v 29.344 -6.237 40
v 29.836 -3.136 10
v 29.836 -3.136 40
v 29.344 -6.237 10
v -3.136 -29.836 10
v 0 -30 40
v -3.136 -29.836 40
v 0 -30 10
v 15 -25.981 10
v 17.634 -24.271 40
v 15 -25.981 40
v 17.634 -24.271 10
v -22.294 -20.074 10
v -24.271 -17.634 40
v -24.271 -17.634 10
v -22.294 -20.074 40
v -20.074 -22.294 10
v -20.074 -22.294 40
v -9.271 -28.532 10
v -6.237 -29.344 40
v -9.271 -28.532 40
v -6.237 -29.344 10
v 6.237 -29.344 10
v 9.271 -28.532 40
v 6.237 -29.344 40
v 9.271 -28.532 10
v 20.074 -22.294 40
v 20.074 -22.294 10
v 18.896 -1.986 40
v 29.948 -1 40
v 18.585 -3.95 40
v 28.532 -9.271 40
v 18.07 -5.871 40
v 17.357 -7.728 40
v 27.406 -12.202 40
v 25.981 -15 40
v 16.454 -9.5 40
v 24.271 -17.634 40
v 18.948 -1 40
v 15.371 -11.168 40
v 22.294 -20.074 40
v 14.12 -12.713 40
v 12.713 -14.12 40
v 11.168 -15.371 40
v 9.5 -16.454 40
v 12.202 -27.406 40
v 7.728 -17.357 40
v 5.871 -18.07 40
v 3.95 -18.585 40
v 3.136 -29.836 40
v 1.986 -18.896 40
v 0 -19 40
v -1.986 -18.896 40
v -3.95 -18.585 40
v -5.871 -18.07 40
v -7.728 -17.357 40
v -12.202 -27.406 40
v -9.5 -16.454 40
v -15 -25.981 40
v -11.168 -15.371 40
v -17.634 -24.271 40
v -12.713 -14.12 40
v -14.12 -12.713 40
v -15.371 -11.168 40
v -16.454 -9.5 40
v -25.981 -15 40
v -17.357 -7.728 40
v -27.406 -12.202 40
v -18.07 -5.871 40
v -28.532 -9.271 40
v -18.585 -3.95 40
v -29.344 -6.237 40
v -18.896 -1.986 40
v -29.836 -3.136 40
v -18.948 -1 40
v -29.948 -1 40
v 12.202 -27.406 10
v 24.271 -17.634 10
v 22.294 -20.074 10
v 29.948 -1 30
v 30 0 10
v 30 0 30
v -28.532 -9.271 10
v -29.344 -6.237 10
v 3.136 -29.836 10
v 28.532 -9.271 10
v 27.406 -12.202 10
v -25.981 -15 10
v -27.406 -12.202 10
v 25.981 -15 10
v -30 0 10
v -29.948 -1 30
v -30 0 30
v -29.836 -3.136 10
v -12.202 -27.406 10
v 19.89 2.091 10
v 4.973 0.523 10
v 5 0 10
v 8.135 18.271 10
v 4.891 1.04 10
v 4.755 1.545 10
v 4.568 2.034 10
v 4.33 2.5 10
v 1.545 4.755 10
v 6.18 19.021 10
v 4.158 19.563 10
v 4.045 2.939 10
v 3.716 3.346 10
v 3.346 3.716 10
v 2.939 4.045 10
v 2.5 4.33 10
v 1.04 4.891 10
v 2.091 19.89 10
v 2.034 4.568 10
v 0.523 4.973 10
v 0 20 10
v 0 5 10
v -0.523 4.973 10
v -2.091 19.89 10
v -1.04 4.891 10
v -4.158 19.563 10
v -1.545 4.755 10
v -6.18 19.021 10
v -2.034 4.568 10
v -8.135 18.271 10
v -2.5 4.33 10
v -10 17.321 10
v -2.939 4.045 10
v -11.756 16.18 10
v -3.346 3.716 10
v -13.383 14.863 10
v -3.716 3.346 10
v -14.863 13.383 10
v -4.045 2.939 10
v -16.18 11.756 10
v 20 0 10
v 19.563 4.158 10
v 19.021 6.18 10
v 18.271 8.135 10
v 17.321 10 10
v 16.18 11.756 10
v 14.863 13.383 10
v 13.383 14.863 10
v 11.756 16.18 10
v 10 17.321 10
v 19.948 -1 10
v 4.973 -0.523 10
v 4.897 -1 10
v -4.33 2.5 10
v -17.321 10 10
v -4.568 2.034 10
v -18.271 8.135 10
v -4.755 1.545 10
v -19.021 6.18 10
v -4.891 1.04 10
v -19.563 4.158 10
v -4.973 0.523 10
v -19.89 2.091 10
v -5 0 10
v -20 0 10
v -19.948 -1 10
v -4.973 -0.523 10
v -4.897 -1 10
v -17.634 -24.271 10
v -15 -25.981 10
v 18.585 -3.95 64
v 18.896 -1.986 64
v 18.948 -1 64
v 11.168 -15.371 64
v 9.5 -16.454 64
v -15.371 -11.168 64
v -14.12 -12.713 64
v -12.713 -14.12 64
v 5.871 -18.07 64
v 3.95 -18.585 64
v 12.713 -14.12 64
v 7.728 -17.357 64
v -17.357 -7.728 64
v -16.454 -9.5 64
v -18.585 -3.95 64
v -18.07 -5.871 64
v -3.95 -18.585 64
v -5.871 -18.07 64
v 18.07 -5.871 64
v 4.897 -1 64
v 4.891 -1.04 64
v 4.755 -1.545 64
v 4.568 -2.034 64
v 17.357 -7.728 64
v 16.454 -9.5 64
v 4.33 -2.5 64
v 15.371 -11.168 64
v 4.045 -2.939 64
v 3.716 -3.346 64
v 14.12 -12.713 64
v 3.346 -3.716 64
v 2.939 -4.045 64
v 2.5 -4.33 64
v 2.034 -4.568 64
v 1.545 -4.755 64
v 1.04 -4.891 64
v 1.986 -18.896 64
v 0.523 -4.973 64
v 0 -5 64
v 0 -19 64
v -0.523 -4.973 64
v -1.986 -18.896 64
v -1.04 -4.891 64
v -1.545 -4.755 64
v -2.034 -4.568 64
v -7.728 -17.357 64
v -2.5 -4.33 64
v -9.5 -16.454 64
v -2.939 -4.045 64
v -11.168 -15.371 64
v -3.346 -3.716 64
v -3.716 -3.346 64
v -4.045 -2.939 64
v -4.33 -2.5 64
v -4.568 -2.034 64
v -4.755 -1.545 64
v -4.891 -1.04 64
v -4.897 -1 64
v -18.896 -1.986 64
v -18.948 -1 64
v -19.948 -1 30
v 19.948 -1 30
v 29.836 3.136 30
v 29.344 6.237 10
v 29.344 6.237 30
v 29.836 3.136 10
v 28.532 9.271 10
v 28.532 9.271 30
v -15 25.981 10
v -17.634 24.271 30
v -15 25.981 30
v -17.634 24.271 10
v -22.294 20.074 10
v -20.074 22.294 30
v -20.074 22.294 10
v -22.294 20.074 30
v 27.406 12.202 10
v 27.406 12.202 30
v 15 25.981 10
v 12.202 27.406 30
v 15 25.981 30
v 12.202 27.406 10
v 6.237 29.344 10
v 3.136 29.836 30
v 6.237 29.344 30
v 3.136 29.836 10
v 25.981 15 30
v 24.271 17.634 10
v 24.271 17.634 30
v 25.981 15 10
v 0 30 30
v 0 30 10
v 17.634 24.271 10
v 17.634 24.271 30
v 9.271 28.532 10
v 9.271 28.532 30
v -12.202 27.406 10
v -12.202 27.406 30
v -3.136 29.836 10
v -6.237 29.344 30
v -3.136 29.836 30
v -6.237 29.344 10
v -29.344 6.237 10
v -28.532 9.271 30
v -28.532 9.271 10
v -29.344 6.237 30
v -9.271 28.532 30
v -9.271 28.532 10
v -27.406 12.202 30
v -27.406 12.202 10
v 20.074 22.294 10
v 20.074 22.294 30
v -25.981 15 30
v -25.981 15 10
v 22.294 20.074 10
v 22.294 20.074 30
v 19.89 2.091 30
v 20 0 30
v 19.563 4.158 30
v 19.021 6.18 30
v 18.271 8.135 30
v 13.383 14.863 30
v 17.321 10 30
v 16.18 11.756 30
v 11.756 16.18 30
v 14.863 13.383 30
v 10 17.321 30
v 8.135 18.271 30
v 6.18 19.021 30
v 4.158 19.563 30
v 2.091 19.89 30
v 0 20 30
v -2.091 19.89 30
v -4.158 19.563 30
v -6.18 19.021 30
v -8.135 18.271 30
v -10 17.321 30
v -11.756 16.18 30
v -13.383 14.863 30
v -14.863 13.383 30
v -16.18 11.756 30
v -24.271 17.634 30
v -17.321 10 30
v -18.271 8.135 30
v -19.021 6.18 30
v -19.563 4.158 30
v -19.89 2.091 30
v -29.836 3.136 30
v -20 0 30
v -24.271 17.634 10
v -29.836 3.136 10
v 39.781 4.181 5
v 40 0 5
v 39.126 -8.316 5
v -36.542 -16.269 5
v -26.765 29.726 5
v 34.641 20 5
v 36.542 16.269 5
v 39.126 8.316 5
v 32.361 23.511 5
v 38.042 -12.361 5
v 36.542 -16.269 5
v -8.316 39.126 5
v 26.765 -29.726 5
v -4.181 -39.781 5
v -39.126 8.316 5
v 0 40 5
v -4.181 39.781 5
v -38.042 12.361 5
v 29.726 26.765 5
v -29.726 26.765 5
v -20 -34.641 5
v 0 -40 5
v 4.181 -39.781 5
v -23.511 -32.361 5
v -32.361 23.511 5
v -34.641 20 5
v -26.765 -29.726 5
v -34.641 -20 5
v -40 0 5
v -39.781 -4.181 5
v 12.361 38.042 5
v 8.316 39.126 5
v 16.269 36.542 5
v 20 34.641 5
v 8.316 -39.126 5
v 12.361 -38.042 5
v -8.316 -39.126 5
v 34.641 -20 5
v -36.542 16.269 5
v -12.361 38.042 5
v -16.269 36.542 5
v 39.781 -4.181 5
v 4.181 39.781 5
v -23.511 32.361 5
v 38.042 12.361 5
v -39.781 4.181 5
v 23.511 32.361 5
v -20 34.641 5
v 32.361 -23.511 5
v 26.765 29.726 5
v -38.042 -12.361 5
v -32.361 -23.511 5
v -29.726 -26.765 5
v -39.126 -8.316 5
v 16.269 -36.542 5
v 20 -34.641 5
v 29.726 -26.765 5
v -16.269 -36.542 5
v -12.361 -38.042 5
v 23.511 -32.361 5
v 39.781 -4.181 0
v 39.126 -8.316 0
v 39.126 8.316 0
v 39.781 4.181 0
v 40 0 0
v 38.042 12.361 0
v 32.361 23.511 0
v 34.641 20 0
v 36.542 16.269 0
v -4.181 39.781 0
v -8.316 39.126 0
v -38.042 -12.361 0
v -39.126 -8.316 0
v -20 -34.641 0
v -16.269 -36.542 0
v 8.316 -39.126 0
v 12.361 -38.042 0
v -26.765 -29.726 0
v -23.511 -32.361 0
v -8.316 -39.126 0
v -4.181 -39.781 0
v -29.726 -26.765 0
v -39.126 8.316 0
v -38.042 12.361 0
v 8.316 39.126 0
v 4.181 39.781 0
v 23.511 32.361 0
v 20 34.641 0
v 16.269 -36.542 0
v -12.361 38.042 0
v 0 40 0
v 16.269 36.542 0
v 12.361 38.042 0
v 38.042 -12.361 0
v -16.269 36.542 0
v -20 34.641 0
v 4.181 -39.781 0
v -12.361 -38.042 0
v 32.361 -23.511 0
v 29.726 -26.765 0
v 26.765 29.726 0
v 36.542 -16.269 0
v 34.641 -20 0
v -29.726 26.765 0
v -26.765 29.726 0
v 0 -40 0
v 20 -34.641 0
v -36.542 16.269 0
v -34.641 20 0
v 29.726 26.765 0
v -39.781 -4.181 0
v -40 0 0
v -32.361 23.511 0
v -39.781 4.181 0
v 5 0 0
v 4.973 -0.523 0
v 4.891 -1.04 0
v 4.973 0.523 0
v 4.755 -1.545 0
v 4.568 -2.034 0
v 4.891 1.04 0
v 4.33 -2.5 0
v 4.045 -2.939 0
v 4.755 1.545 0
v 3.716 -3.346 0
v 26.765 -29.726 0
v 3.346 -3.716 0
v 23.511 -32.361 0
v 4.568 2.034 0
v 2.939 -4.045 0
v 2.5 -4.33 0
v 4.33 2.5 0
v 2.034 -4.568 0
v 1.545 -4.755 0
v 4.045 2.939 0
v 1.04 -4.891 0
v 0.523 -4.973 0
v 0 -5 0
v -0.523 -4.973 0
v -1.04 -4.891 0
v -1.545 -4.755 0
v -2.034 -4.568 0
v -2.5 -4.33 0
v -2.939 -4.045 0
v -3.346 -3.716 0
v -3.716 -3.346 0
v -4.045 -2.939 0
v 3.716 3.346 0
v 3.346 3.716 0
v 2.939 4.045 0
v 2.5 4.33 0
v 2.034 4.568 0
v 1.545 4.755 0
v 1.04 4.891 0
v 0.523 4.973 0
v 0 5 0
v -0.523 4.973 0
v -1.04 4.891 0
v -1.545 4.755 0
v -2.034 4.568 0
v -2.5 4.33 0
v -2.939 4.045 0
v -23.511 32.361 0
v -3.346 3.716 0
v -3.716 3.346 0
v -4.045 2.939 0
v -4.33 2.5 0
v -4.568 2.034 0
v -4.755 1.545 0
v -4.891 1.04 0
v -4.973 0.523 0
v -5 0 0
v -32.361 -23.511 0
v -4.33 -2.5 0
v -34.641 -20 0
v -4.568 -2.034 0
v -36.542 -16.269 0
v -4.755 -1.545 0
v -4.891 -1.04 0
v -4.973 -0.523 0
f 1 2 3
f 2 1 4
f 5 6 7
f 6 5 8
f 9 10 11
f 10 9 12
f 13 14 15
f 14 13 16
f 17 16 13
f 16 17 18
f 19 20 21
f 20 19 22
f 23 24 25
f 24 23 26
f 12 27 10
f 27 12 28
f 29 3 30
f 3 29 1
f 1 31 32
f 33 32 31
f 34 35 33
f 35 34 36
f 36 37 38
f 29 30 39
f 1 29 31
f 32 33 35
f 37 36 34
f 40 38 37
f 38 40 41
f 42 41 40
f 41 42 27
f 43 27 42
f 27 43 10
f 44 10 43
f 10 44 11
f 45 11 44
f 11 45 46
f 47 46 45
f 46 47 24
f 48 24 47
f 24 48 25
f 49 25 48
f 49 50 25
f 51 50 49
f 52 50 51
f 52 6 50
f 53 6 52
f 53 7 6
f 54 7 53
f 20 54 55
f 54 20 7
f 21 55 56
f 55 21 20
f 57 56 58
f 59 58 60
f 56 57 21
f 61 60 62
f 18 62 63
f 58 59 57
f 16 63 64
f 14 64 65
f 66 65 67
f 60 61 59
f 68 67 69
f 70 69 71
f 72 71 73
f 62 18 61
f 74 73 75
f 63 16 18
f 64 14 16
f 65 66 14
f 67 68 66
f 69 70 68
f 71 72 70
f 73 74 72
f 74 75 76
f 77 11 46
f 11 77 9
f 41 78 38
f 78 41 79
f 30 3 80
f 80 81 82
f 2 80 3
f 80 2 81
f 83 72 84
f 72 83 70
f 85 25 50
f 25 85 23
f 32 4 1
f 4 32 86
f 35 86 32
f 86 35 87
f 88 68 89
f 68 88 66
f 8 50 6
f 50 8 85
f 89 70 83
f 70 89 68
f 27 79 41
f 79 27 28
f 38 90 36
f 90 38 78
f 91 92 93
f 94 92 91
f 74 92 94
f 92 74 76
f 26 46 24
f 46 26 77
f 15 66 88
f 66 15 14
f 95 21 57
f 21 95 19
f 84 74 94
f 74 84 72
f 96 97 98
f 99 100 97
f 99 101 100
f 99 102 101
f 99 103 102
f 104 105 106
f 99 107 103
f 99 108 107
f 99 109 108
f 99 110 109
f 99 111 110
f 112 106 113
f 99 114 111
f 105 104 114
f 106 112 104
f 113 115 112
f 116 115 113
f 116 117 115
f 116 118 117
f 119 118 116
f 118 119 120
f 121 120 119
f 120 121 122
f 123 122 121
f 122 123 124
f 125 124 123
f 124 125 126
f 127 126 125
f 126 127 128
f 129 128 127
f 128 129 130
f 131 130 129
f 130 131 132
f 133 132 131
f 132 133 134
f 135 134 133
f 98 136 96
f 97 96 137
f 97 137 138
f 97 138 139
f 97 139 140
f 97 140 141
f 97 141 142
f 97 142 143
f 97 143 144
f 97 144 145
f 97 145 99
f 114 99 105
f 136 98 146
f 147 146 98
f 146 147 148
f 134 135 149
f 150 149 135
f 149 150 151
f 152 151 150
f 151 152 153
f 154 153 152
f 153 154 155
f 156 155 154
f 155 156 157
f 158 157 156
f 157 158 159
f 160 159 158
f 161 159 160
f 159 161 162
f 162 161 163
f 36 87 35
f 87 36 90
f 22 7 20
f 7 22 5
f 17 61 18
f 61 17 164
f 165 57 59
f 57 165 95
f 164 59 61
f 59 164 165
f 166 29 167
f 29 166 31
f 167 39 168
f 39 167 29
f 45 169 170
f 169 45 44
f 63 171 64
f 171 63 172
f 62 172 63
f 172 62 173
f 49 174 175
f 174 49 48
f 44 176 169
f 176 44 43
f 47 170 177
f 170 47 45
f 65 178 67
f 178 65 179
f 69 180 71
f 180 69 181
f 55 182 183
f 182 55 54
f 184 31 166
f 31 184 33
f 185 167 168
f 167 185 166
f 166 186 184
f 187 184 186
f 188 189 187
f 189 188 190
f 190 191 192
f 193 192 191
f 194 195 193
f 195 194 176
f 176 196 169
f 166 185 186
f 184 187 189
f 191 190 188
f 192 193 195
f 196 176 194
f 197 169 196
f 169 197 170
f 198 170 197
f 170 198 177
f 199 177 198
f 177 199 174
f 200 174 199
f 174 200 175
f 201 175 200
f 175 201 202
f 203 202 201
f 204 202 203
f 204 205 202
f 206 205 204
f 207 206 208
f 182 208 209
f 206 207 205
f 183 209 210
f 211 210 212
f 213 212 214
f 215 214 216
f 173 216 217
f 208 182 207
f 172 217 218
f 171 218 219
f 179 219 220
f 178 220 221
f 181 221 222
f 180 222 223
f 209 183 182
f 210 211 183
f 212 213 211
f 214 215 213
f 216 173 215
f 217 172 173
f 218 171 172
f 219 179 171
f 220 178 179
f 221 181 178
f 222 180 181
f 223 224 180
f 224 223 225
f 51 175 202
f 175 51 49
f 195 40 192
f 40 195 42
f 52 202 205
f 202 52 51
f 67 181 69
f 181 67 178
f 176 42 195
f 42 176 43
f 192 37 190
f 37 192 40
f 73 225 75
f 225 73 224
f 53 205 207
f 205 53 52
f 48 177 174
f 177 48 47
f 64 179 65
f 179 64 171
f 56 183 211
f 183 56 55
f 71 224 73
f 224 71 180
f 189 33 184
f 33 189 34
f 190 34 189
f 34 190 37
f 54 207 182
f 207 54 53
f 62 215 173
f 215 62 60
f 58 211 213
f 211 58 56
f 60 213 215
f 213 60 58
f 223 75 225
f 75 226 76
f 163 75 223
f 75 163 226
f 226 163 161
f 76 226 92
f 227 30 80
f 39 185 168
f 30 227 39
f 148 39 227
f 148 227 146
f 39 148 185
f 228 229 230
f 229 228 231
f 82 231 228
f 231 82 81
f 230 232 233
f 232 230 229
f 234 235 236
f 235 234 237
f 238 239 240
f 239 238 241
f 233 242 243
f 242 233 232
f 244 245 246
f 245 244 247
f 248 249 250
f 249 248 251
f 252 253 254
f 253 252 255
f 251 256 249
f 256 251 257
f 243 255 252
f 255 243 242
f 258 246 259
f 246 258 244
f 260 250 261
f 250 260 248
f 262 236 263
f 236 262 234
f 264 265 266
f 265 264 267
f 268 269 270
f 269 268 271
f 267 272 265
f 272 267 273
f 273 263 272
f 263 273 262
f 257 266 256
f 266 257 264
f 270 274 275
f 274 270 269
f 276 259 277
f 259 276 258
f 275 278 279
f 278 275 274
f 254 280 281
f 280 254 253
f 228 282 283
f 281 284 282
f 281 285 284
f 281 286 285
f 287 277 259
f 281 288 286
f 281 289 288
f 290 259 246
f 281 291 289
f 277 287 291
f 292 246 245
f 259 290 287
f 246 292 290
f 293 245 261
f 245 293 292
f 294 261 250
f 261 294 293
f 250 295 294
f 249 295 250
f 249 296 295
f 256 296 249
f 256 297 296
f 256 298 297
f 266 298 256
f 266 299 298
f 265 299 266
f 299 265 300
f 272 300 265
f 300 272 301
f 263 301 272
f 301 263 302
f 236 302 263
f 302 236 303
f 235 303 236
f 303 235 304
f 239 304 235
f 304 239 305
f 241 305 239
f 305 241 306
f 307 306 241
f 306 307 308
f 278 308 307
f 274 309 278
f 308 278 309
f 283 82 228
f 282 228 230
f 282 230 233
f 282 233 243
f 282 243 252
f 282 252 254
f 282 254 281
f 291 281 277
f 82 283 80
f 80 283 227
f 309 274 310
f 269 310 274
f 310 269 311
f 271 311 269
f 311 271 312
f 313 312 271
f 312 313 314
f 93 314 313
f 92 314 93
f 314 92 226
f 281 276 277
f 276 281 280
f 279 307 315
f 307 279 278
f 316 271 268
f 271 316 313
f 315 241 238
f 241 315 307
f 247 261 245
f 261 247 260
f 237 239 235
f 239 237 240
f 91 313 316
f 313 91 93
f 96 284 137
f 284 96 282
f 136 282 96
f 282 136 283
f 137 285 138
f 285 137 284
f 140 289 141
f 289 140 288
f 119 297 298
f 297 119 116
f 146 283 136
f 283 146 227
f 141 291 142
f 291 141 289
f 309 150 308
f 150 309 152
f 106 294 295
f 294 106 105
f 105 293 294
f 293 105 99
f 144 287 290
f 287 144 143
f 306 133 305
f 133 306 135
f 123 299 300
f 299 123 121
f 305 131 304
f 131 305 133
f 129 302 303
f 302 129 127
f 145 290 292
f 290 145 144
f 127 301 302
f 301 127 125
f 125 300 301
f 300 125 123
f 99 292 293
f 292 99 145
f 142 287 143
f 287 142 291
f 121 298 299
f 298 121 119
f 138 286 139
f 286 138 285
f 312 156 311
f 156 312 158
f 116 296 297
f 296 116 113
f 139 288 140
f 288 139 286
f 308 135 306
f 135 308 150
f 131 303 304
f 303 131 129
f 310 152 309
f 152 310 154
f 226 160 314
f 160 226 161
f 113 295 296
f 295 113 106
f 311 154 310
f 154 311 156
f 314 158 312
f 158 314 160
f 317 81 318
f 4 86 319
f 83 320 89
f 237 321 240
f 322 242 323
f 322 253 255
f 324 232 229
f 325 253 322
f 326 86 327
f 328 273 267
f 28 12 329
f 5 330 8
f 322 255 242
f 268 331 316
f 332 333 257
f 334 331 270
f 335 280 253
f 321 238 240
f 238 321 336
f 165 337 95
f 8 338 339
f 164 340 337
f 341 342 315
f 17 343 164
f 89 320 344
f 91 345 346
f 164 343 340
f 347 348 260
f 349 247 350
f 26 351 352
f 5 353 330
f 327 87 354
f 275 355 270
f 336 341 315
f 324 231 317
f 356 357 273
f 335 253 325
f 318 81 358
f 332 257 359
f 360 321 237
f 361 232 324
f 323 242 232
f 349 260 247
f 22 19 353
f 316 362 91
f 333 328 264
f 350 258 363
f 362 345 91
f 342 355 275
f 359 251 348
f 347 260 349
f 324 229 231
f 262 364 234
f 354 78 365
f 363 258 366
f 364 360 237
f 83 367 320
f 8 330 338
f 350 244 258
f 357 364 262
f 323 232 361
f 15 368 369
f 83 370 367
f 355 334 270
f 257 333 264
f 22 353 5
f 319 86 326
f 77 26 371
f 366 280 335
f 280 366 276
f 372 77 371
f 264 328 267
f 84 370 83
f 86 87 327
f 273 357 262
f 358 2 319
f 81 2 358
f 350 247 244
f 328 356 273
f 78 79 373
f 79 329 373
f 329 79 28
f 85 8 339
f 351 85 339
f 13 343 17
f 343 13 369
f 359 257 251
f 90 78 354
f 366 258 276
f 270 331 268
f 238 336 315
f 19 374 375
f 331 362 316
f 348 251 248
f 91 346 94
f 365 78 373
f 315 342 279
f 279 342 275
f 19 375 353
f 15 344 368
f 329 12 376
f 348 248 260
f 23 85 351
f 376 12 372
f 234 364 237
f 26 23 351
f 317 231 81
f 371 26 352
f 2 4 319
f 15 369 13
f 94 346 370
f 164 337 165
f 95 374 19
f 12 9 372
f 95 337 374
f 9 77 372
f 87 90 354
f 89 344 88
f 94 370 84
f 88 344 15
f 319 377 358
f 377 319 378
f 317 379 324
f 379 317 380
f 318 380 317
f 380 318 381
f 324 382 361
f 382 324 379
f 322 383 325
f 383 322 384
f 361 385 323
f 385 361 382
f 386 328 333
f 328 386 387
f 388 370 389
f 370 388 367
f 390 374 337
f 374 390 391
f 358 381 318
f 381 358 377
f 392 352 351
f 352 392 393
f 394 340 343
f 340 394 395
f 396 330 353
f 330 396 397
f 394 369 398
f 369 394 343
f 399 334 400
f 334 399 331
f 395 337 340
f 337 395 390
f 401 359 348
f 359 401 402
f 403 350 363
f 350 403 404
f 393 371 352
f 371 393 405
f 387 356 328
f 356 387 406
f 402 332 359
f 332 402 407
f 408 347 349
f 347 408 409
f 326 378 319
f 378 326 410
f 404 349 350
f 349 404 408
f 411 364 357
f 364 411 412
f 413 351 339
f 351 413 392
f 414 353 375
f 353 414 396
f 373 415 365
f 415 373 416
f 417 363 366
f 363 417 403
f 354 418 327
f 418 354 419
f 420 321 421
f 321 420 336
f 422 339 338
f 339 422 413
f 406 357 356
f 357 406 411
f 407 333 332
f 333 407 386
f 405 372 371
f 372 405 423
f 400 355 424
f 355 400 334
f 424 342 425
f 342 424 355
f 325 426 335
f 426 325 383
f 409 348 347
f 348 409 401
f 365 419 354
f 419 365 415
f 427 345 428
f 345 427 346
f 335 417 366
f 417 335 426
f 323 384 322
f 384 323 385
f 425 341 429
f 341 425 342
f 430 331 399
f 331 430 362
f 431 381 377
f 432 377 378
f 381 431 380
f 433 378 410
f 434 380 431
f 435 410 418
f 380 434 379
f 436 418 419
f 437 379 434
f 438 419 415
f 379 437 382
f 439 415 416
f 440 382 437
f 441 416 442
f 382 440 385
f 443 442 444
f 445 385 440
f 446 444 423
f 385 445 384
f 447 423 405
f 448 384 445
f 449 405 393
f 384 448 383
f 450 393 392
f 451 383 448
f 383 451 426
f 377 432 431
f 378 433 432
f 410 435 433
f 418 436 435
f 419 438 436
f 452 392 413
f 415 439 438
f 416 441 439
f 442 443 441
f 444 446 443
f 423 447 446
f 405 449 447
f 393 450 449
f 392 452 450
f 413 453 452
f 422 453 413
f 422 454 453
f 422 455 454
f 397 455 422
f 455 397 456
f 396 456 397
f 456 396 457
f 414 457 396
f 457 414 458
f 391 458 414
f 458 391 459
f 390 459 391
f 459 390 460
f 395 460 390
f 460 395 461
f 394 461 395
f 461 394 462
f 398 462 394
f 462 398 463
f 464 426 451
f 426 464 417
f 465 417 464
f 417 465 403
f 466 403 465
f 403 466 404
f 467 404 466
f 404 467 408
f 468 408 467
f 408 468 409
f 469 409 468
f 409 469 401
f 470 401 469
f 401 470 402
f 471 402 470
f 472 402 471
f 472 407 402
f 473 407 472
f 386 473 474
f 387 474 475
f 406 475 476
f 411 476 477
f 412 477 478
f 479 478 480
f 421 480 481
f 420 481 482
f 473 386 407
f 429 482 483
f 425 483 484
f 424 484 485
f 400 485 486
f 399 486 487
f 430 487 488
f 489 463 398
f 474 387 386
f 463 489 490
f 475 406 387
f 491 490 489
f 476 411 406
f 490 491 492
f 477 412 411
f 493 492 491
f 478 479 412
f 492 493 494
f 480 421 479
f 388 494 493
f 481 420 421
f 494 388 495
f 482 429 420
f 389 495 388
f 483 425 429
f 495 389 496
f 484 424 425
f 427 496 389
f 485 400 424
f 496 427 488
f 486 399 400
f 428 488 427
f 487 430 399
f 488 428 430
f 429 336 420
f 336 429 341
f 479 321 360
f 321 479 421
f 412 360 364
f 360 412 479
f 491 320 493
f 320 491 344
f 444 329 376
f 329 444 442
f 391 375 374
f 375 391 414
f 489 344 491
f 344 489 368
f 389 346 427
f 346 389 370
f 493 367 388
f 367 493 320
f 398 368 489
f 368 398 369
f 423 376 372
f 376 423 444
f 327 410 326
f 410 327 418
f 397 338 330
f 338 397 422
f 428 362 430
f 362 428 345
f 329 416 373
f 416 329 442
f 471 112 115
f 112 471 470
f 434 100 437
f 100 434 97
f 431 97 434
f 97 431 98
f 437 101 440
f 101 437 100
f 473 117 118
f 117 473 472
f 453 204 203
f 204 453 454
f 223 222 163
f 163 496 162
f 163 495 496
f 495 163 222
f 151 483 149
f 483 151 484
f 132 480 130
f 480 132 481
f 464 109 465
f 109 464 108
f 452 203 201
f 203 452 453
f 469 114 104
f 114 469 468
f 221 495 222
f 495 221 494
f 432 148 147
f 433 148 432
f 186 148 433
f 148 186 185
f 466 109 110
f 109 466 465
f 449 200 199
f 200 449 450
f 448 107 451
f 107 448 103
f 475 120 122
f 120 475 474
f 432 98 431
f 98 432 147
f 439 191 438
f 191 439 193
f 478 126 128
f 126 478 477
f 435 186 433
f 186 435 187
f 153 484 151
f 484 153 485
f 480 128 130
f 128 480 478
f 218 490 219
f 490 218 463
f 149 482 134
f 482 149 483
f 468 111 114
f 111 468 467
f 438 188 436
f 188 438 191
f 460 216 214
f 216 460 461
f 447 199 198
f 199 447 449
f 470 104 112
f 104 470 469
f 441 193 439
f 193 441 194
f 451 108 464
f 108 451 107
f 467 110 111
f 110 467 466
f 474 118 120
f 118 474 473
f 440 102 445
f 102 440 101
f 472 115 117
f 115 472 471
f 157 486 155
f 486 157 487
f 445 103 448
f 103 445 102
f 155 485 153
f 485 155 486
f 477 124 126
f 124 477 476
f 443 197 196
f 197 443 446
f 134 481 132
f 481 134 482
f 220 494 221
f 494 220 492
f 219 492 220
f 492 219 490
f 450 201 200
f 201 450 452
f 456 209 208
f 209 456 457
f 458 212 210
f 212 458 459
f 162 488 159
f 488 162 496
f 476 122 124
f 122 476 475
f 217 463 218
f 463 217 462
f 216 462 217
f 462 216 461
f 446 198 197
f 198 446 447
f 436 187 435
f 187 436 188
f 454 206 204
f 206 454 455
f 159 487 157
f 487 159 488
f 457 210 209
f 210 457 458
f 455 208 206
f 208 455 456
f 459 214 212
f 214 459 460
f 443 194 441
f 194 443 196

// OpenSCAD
$fn=60;

module spindle_distance()
{
    translate([0,0,10])
    difference()
    {
        union()
        {
            difference()
            {
                union()
                {
                    cylinder(h=30,r=30);
                    cylinder(h=54,r=19);
                }
                
                translate([-30,-1,0])
                    cube([60,60,60]);
            }

            difference()
            {
                cylinder(h=20,r=30);
                cylinder(h=60,r=20);
                
                translate([-30,-62,0])
                    cube([60,60,60]);
            }

            translate([0,0,-5])
                cylinder(h=5,r1=40,r2=30);

            translate([0,0,-10])
                cylinder(h=5,r=40);
        }
        translate([0,0,-10])
            cylinder(r=5,h=80);
    }
}

spindle_distance();

//translate([0,0,75])
//rotate([0,180,180])
//spindle();
